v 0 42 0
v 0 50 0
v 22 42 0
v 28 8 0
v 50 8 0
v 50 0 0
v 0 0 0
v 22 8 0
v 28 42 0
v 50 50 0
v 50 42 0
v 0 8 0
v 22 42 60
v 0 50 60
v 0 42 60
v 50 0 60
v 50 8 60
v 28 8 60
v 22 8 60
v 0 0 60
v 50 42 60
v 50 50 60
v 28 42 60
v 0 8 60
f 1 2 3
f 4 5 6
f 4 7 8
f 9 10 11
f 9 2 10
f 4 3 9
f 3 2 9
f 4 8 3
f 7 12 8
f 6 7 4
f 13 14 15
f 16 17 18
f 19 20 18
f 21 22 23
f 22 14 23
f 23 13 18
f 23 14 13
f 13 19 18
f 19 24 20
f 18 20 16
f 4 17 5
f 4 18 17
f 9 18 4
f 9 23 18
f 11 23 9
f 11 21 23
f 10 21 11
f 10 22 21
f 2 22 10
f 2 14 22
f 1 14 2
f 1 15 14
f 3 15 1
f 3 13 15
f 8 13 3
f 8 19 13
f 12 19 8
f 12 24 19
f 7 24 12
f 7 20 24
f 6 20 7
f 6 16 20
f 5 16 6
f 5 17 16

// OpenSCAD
$fn = 32;

// ----------------------------------------------------------------------
// Structural section: ibeam 50 x 50 mm
// ----------------------------------------------------------------------

// --- parameters (mm) ---
sec_w = 50;               // section width, X
sec_h = 50;               // section height, Y
flange_t = 8;             // flange thickness
web_t = 6;                // web thickness
plate_t = 60;             // cut length, Z (extrusion height)

profile = [[0, 0], [50, 0], [50, 8], [28, 8], [28, 42], [50, 42], [50, 50], [0, 50], [0, 42], [22, 42], [22, 8], [0, 8]];  // primary outline, 12 points, counter clockwise

// --- the one profile operation ---
linear_extrude(height = plate_t) polygon(points = profile);
